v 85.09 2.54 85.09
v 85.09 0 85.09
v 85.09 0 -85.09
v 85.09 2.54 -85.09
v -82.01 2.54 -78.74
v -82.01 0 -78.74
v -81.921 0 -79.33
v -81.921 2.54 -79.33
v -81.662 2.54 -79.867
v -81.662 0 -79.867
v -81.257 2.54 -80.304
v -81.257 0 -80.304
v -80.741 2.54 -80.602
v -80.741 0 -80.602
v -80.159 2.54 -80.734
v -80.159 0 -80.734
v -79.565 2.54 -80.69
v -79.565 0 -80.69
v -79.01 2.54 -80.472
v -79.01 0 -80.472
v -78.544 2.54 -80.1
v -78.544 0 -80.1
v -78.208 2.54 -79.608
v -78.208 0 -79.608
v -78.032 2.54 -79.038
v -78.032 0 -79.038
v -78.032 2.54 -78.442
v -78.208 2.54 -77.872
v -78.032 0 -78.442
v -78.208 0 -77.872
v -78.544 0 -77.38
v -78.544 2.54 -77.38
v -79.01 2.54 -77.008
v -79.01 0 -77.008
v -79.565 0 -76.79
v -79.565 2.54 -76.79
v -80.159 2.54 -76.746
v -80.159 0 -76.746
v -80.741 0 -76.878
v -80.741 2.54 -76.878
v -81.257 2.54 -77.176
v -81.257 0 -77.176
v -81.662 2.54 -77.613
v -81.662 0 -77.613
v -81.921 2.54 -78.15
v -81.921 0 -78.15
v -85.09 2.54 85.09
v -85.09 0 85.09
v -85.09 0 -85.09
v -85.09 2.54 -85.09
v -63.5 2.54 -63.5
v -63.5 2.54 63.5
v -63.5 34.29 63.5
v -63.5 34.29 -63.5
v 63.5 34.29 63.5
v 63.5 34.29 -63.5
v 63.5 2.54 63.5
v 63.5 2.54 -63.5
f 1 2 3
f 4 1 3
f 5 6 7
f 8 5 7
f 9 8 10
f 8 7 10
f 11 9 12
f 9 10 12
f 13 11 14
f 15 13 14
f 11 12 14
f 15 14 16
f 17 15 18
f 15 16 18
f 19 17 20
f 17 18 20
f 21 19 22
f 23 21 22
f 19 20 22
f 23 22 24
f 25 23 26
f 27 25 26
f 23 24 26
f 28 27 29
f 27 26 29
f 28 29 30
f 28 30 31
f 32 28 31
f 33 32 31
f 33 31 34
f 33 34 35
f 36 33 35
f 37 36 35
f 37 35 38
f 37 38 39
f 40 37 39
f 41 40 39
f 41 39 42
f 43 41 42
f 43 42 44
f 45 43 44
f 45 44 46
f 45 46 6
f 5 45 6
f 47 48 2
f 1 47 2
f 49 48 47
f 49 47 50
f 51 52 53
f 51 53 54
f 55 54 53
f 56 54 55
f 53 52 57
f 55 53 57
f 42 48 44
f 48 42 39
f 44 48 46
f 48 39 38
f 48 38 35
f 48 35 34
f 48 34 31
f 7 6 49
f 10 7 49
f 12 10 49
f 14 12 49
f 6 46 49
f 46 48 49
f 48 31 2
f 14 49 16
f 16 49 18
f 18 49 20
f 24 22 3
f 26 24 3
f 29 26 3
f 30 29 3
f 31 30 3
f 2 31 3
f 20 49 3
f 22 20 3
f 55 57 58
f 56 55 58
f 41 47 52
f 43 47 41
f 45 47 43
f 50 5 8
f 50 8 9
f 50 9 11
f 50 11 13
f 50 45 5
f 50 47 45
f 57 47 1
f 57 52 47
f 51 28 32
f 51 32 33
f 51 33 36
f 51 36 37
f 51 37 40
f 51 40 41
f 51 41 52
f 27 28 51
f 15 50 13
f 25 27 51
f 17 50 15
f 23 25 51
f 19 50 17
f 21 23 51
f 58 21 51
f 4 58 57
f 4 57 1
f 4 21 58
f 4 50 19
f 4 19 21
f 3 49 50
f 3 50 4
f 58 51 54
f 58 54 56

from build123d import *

# Parameters (mm, degrees)
SKETCH1_W                 = 170.18
SKETCH1_H                 = 170.18
BOSS_EXTRUDE1_DEPTH       = 2.54
SKETCH2_W                 = 127
SKETCH2_H                 = 127
BOSS_EXTRUDE2_DEPTH       = 31.75
F_4_0MM_DOWEL_HOLE1_D     = 4
F_4_0MM_DOWEL_HOLE1_DEPTH = 12.7
F_4_0MM_DOWEL_HOLE1_TIP   = 1.201721238


with BuildPart() as part:
    # Sketch1 → Boss-Extrude1 (new body)
    with BuildSketch(Plane(origin=(0, 0, 0), x_dir=(1, 0, 0), z_dir=(0, 1, 0))):
        Rectangle(SKETCH1_W, SKETCH1_H)
    extrude(amount=BOSS_EXTRUDE1_DEPTH)

    # Sketch2 → Boss-Extrude2 (add)
    with BuildSketch(Plane(origin=(0, 2.54, 0), x_dir=(1, 0, 0), z_dir=(0, 1, 0))):
        Rectangle(SKETCH2_W, SKETCH2_H)
    extrude(amount=BOSS_EXTRUDE2_DEPTH)

    # Ø4.0mm Dowel Hole1
    with Locations(Plane(origin=(0, 2.54, 0), x_dir=(1, 0, 0), z_dir=(0, 1, 0))):
        with Locations((-80.01, 78.74)):
            Hole(F_4_0MM_DOWEL_HOLE1_D / 2, depth=F_4_0MM_DOWEL_HOLE1_DEPTH)
            with Locations((0, 0, -(F_4_0MM_DOWEL_HOLE1_DEPTH + F_4_0MM_DOWEL_HOLE1_TIP / 2))):  # 118° drill point
                Cone(0, F_4_0MM_DOWEL_HOLE1_D / 2, F_4_0MM_DOWEL_HOLE1_TIP, mode=Mode.SUBTRACT)


solid = part.part
